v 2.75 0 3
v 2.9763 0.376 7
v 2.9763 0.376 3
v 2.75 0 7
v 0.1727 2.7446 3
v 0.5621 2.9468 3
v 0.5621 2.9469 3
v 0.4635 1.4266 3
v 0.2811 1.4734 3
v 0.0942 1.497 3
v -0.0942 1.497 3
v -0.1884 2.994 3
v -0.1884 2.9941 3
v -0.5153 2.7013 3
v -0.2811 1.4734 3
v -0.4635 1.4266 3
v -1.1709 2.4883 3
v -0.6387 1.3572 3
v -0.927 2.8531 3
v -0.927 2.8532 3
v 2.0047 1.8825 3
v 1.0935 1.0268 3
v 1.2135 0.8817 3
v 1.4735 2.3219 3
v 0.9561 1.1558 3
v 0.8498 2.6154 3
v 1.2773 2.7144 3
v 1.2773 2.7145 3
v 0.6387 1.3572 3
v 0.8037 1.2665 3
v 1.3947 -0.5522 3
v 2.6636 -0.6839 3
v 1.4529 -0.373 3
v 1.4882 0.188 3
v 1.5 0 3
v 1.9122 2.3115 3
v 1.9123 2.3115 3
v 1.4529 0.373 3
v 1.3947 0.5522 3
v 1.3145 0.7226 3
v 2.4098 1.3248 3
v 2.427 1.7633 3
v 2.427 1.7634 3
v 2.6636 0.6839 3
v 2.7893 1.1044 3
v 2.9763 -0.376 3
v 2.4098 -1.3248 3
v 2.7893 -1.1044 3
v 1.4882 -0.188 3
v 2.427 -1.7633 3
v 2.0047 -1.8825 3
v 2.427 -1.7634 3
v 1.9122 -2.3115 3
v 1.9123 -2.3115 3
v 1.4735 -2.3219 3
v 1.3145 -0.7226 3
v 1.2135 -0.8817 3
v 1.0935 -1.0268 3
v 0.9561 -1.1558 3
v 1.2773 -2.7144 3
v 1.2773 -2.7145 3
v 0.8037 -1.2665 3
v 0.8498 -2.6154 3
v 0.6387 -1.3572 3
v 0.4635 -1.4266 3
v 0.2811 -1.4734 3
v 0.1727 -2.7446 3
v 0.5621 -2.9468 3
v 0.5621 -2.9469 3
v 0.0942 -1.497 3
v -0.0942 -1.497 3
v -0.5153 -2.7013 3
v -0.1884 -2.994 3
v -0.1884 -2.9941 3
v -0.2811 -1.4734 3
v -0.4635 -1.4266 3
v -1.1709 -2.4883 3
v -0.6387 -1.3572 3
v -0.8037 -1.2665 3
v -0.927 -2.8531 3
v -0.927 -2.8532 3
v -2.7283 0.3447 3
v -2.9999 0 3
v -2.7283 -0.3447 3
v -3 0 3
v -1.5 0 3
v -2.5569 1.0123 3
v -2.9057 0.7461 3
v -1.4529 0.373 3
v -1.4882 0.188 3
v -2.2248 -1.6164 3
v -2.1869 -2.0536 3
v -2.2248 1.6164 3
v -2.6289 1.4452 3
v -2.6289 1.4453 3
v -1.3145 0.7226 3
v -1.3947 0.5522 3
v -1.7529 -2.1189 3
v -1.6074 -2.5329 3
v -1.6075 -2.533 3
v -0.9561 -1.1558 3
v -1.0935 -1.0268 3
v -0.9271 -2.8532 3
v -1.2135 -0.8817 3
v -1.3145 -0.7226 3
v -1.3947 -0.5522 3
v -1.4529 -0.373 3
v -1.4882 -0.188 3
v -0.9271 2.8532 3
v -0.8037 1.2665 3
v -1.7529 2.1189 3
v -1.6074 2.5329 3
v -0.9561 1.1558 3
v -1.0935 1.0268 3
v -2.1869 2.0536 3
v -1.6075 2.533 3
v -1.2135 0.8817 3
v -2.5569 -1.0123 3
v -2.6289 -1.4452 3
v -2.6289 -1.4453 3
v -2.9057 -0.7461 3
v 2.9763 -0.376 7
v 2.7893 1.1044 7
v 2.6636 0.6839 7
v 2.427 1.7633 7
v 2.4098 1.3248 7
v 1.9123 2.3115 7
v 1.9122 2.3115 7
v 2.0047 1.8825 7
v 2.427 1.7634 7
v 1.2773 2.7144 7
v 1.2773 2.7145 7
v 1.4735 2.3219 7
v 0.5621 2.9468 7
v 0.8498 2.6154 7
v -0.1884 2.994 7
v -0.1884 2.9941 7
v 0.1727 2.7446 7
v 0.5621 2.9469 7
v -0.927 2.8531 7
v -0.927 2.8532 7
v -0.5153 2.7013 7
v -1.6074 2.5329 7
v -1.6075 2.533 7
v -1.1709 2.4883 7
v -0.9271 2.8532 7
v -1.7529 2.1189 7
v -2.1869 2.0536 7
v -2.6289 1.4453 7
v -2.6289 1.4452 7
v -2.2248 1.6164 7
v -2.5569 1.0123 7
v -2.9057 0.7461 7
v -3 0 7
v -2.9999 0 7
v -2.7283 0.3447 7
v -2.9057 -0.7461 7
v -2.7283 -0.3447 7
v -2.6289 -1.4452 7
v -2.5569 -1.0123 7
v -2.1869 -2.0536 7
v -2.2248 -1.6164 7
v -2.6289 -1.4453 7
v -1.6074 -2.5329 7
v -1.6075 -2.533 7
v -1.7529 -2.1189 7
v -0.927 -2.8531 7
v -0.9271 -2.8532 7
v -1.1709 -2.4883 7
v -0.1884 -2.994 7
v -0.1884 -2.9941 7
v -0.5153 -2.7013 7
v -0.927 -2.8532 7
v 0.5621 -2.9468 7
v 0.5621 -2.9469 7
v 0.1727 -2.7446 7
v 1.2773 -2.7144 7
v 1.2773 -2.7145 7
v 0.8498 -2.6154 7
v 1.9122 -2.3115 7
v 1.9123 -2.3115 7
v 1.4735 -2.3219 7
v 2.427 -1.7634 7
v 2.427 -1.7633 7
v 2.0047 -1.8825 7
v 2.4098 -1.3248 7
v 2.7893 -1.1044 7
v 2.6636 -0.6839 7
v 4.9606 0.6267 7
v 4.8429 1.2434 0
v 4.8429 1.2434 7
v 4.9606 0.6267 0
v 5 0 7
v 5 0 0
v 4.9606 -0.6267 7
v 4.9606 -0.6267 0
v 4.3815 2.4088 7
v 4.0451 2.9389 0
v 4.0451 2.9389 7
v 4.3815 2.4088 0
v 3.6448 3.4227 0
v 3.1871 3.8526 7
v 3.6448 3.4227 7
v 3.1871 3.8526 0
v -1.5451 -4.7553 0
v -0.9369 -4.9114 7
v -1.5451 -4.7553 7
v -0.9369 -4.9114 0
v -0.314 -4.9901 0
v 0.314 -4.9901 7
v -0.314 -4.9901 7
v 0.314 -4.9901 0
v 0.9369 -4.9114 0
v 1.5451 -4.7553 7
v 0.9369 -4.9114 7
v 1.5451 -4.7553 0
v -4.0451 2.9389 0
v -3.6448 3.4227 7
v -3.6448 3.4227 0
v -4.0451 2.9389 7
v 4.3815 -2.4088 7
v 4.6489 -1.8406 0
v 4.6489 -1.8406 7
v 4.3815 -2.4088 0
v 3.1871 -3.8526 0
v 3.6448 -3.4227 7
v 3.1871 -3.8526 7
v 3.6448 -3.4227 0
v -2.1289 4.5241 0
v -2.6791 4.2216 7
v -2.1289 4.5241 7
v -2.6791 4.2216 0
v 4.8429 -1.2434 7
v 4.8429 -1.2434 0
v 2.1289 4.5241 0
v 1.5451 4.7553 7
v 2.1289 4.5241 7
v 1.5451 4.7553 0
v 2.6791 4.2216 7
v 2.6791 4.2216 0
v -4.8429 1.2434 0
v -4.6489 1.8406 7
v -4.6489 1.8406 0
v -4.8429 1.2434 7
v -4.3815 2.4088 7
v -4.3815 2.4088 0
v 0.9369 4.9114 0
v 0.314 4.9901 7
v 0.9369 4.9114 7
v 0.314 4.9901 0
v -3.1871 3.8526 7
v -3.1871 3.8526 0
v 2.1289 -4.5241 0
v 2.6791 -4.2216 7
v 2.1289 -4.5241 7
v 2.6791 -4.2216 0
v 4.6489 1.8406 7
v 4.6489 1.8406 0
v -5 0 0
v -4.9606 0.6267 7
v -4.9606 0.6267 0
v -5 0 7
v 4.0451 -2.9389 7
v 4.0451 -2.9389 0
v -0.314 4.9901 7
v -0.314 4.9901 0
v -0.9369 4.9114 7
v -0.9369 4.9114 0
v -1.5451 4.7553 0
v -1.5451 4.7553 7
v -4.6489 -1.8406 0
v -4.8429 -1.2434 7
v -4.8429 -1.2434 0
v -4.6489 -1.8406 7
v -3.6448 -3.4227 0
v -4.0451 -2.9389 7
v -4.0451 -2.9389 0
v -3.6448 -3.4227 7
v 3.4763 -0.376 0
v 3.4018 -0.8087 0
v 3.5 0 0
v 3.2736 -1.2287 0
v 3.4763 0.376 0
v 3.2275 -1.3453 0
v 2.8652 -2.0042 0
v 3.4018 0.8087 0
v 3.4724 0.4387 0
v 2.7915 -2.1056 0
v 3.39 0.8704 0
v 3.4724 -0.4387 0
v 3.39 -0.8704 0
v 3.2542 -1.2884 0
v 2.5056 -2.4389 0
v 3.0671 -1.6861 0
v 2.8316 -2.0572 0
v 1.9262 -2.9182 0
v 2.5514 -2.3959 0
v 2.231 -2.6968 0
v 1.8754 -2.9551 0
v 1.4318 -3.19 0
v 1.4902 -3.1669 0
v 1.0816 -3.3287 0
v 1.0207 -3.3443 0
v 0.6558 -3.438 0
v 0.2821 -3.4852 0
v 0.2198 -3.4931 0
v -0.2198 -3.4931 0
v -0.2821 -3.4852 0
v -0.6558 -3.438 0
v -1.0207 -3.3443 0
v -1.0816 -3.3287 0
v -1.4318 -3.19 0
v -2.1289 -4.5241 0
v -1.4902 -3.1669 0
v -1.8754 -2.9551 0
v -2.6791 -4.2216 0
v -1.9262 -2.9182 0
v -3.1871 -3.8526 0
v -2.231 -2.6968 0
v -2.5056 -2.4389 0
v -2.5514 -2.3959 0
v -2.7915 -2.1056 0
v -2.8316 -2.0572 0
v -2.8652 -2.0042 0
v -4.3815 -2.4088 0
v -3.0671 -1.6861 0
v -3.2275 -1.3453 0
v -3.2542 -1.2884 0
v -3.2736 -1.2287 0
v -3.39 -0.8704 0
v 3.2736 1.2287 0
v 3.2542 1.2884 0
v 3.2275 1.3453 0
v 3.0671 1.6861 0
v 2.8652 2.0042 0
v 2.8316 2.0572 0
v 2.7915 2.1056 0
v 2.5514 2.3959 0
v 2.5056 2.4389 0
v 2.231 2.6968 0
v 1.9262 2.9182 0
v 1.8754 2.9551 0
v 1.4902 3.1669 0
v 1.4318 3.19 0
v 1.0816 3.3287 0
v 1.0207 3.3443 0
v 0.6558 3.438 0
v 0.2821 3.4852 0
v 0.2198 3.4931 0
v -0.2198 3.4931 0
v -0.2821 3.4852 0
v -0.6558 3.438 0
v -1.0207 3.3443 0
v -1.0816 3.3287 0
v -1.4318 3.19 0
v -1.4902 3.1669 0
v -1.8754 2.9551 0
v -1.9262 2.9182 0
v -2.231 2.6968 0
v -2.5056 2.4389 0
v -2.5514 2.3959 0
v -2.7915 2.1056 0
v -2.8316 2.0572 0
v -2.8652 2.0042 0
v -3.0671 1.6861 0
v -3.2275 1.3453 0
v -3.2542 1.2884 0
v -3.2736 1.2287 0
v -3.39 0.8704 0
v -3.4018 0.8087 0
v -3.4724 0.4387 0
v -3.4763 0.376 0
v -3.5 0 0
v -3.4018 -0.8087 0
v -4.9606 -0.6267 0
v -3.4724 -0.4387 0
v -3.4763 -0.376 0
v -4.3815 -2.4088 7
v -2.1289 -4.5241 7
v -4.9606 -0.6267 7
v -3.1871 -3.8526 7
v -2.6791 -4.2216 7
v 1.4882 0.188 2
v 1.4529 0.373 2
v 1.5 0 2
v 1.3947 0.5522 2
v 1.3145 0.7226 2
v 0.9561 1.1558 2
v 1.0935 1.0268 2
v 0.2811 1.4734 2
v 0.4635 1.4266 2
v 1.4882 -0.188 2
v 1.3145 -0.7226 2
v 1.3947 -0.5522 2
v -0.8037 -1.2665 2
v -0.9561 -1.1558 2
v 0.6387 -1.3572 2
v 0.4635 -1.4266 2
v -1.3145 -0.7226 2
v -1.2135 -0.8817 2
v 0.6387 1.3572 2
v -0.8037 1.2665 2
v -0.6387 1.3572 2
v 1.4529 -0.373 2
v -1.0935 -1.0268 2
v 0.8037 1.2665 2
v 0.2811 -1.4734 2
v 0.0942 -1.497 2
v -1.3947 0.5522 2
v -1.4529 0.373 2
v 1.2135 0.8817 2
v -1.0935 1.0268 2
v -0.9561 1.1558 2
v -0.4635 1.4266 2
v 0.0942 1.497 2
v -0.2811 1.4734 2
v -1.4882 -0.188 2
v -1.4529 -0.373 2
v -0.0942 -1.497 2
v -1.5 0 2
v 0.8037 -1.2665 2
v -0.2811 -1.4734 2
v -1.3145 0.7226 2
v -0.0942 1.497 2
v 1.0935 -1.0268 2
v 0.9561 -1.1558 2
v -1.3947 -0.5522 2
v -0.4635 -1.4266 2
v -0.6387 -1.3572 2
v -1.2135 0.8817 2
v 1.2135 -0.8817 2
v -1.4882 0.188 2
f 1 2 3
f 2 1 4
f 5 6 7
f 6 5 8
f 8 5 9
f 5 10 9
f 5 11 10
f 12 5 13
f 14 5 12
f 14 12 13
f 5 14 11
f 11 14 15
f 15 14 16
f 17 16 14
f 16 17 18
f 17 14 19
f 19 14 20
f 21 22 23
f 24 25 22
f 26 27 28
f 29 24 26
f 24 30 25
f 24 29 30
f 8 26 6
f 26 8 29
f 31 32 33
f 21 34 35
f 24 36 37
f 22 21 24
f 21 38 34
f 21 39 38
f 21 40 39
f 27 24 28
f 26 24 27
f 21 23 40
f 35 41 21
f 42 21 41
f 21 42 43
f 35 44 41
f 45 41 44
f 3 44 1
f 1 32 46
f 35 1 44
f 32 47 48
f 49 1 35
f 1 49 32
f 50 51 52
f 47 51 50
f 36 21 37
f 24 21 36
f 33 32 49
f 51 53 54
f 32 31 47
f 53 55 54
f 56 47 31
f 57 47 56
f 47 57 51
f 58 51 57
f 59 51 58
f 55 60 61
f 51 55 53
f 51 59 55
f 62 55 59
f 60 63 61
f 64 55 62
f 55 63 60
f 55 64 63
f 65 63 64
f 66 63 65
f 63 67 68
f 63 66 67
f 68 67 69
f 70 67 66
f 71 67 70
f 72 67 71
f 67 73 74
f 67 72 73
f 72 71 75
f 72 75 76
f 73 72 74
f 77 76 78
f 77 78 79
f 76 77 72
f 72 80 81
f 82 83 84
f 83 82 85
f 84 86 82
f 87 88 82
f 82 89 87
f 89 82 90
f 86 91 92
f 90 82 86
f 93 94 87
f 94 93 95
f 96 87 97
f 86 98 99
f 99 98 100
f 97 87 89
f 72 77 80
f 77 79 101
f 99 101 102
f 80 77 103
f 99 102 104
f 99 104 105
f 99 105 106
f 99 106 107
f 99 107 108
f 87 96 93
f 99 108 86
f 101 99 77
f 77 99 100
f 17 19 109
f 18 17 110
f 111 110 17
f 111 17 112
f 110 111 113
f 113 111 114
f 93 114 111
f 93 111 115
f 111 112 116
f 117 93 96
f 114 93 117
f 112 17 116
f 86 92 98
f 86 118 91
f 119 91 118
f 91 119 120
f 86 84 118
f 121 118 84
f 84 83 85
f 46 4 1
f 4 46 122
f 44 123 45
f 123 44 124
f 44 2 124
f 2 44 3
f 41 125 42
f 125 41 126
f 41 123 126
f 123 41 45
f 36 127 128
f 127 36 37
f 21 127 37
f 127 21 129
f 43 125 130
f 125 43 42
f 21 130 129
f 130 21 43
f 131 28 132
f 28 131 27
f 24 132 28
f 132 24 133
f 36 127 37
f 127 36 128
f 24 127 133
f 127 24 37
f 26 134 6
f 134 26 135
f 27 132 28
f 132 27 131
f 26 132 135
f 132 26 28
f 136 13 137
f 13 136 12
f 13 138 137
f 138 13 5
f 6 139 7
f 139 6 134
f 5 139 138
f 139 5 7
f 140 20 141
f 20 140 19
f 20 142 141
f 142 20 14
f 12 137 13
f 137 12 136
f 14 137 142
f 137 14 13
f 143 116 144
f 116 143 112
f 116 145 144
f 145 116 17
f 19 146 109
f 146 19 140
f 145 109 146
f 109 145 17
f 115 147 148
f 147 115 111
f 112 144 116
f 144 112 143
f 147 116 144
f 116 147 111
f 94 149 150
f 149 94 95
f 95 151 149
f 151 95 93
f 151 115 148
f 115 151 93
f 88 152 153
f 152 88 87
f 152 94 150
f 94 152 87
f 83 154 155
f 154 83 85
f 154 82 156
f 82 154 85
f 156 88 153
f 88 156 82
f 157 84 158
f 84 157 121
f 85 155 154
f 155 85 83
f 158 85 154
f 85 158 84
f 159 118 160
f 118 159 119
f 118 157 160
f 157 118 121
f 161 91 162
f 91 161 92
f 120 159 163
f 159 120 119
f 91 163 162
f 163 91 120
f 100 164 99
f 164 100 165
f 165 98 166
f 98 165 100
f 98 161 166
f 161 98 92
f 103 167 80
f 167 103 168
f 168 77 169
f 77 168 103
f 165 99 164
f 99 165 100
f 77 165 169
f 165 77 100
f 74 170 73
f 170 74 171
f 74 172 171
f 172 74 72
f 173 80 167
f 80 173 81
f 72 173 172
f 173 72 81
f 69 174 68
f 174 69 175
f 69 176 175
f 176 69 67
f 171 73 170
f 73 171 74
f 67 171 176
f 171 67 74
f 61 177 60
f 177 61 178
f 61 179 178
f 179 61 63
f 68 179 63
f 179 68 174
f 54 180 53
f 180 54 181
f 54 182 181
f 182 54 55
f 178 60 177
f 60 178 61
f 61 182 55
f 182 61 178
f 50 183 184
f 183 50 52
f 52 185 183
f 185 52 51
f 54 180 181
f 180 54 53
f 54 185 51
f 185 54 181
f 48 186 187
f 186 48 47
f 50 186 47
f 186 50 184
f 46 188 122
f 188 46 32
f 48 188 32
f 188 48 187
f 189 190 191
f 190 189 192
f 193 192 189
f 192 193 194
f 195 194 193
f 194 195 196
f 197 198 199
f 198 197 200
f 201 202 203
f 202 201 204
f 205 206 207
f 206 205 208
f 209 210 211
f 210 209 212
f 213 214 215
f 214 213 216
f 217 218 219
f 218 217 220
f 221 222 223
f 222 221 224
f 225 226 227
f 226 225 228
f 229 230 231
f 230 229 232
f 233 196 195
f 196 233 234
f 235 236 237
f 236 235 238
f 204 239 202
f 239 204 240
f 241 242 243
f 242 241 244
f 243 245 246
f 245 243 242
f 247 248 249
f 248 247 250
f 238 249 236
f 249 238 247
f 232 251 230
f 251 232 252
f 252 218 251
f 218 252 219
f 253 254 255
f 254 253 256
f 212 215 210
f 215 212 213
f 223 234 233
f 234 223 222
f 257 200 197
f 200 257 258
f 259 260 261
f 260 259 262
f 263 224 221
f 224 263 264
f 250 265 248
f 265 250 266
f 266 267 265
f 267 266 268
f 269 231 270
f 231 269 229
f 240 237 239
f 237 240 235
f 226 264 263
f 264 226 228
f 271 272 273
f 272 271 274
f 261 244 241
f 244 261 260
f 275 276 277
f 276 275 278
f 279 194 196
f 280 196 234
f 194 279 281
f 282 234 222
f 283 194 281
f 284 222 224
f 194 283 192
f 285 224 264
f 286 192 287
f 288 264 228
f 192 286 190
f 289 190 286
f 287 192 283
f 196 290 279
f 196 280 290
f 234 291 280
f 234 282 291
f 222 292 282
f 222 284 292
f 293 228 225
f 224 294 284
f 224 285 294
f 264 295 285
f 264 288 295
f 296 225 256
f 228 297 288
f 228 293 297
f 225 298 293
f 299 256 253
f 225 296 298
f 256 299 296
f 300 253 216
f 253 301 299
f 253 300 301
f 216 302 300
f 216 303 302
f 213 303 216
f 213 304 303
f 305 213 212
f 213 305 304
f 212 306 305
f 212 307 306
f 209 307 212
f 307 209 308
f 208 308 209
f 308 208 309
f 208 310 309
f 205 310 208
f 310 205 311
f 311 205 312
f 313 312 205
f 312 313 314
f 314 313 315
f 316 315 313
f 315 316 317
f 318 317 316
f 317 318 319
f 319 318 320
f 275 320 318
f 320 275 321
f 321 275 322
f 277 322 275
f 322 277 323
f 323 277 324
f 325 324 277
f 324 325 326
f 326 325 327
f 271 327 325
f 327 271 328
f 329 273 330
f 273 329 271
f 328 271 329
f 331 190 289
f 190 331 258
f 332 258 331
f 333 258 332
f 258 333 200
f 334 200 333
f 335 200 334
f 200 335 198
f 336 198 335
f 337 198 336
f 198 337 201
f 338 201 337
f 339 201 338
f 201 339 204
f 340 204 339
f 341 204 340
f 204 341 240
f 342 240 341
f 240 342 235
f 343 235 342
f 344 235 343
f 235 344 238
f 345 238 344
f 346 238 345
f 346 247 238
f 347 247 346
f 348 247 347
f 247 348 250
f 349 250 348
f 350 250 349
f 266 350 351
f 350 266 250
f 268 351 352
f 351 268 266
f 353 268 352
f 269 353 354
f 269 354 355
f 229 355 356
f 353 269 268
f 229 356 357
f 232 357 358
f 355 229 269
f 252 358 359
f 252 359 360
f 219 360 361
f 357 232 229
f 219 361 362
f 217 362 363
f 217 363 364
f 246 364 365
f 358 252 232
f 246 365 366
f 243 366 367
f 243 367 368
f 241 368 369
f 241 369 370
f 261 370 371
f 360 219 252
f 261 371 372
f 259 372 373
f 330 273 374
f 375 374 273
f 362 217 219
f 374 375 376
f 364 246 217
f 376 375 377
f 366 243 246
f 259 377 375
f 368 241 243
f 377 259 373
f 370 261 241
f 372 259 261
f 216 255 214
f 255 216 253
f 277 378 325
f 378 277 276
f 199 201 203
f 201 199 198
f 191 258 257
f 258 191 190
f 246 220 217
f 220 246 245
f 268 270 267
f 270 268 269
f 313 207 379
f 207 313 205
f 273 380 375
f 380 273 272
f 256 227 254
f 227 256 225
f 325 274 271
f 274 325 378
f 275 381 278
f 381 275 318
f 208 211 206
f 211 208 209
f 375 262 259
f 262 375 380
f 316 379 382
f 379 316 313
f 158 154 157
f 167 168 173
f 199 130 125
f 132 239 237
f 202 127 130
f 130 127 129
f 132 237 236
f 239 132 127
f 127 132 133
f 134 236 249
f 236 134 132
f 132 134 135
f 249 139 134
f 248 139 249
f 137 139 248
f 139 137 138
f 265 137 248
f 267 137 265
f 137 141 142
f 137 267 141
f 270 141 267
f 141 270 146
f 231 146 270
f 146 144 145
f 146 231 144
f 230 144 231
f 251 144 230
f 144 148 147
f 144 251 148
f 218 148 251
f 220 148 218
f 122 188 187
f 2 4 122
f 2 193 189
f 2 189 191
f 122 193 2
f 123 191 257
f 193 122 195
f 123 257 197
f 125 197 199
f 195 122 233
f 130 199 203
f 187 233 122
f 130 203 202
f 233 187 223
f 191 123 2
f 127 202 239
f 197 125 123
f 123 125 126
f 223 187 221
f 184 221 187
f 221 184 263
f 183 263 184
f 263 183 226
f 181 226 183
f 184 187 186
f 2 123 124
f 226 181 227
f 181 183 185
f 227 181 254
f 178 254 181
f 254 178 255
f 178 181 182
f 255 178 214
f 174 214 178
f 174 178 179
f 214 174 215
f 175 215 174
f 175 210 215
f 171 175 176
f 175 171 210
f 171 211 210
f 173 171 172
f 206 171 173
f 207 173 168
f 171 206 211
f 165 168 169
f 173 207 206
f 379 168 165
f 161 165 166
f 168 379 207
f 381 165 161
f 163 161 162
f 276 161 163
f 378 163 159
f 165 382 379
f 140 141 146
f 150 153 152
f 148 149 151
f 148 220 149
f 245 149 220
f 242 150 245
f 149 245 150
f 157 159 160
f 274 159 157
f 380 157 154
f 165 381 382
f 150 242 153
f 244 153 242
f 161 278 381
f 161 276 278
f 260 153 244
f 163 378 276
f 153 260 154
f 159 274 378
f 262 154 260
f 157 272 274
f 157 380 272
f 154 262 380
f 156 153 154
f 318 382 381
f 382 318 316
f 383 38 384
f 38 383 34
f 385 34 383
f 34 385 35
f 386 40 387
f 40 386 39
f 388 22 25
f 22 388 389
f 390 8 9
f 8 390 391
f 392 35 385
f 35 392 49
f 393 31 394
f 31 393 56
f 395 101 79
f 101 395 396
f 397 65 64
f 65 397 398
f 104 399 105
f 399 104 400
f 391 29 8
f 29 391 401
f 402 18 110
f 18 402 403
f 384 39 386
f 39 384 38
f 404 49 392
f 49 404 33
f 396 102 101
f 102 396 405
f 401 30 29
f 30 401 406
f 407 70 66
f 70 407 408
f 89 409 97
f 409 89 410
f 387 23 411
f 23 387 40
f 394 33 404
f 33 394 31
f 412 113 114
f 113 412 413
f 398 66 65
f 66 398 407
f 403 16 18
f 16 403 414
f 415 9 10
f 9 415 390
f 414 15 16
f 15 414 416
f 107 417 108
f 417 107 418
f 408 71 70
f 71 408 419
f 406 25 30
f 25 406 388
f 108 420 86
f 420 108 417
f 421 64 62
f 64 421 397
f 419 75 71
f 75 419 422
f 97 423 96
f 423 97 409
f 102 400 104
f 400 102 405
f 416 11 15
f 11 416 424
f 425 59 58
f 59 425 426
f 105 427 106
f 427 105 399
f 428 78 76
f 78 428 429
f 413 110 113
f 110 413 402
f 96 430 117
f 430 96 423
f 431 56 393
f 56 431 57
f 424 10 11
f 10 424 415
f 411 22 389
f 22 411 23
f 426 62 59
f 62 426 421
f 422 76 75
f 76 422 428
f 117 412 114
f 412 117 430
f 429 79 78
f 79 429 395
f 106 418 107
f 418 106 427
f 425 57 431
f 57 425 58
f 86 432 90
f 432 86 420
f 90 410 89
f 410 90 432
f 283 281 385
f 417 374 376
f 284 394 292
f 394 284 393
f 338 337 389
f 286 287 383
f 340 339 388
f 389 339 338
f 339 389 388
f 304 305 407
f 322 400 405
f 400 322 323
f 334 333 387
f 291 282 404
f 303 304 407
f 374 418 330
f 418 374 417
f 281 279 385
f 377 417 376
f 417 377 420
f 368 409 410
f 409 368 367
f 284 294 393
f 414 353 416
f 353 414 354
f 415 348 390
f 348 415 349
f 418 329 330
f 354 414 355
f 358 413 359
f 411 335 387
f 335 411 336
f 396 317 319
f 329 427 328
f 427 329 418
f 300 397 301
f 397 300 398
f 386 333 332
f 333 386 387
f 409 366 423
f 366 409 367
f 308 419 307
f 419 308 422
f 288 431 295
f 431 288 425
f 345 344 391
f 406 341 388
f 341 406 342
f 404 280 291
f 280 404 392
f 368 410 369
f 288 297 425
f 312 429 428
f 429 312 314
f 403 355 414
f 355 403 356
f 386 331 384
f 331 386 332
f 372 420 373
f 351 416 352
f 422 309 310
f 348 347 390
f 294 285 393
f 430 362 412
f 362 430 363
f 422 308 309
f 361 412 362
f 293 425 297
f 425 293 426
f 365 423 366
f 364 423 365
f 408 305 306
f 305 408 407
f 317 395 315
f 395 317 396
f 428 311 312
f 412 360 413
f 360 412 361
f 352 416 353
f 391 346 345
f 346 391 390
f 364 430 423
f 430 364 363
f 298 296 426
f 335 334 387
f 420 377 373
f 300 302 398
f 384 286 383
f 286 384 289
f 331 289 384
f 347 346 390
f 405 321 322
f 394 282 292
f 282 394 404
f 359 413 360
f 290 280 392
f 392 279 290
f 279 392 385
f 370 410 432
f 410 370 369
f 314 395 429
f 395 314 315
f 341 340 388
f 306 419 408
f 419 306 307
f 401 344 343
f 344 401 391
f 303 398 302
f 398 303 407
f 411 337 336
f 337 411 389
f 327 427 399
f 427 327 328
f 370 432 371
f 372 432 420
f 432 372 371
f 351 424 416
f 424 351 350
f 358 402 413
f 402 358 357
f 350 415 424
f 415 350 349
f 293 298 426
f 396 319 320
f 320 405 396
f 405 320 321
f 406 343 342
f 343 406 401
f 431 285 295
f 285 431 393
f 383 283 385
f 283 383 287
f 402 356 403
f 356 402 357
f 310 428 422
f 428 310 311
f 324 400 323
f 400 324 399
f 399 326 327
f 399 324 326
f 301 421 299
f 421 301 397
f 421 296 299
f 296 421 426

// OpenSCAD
infinity = 1000;

module servo_arm_base(d=10 /* diameter of base */, h=7 /* height of base */, ds1=6 /* external diameter of servo axis */, ds2=5.5 /* internal diameter of servo axis, between teeth */, hs=4 /* height of servo axis cavity */, teeth=25 /* number of teeth */, d_hole=3 /* diameter of screw hole */)
{
	difference()
	{
		cylinder(r=d/2, h=h);
		cylinder(r=d_hole/2, h=infinity, center=true);
		translate([0,0,-1])
			cylinder(r2=d_hole/2, r1=d_hole/2+(h-hs)*2/3+1, h=(h-hs)*2/3+1);
		translate([0,0,h-hs])
			union()	for(i=[0:teeth])
				rotate([0,0,360/teeth*i])
					for(j=[1,-1]) scale([1, j, 1])
						linear_extrude(h)
							polygon(points=[[ds2/2,0], [ds1/2*cos(360/teeth/2),ds1/2*sin(360/teeth/2)],
							/* just for good rendering in this bastard */ [0,ds1/2*sin(360/teeth/2)], [0,-ds1/2*sin(360/teeth/2)]]);
	}
}

$fn=50;
servo_arm_base();
